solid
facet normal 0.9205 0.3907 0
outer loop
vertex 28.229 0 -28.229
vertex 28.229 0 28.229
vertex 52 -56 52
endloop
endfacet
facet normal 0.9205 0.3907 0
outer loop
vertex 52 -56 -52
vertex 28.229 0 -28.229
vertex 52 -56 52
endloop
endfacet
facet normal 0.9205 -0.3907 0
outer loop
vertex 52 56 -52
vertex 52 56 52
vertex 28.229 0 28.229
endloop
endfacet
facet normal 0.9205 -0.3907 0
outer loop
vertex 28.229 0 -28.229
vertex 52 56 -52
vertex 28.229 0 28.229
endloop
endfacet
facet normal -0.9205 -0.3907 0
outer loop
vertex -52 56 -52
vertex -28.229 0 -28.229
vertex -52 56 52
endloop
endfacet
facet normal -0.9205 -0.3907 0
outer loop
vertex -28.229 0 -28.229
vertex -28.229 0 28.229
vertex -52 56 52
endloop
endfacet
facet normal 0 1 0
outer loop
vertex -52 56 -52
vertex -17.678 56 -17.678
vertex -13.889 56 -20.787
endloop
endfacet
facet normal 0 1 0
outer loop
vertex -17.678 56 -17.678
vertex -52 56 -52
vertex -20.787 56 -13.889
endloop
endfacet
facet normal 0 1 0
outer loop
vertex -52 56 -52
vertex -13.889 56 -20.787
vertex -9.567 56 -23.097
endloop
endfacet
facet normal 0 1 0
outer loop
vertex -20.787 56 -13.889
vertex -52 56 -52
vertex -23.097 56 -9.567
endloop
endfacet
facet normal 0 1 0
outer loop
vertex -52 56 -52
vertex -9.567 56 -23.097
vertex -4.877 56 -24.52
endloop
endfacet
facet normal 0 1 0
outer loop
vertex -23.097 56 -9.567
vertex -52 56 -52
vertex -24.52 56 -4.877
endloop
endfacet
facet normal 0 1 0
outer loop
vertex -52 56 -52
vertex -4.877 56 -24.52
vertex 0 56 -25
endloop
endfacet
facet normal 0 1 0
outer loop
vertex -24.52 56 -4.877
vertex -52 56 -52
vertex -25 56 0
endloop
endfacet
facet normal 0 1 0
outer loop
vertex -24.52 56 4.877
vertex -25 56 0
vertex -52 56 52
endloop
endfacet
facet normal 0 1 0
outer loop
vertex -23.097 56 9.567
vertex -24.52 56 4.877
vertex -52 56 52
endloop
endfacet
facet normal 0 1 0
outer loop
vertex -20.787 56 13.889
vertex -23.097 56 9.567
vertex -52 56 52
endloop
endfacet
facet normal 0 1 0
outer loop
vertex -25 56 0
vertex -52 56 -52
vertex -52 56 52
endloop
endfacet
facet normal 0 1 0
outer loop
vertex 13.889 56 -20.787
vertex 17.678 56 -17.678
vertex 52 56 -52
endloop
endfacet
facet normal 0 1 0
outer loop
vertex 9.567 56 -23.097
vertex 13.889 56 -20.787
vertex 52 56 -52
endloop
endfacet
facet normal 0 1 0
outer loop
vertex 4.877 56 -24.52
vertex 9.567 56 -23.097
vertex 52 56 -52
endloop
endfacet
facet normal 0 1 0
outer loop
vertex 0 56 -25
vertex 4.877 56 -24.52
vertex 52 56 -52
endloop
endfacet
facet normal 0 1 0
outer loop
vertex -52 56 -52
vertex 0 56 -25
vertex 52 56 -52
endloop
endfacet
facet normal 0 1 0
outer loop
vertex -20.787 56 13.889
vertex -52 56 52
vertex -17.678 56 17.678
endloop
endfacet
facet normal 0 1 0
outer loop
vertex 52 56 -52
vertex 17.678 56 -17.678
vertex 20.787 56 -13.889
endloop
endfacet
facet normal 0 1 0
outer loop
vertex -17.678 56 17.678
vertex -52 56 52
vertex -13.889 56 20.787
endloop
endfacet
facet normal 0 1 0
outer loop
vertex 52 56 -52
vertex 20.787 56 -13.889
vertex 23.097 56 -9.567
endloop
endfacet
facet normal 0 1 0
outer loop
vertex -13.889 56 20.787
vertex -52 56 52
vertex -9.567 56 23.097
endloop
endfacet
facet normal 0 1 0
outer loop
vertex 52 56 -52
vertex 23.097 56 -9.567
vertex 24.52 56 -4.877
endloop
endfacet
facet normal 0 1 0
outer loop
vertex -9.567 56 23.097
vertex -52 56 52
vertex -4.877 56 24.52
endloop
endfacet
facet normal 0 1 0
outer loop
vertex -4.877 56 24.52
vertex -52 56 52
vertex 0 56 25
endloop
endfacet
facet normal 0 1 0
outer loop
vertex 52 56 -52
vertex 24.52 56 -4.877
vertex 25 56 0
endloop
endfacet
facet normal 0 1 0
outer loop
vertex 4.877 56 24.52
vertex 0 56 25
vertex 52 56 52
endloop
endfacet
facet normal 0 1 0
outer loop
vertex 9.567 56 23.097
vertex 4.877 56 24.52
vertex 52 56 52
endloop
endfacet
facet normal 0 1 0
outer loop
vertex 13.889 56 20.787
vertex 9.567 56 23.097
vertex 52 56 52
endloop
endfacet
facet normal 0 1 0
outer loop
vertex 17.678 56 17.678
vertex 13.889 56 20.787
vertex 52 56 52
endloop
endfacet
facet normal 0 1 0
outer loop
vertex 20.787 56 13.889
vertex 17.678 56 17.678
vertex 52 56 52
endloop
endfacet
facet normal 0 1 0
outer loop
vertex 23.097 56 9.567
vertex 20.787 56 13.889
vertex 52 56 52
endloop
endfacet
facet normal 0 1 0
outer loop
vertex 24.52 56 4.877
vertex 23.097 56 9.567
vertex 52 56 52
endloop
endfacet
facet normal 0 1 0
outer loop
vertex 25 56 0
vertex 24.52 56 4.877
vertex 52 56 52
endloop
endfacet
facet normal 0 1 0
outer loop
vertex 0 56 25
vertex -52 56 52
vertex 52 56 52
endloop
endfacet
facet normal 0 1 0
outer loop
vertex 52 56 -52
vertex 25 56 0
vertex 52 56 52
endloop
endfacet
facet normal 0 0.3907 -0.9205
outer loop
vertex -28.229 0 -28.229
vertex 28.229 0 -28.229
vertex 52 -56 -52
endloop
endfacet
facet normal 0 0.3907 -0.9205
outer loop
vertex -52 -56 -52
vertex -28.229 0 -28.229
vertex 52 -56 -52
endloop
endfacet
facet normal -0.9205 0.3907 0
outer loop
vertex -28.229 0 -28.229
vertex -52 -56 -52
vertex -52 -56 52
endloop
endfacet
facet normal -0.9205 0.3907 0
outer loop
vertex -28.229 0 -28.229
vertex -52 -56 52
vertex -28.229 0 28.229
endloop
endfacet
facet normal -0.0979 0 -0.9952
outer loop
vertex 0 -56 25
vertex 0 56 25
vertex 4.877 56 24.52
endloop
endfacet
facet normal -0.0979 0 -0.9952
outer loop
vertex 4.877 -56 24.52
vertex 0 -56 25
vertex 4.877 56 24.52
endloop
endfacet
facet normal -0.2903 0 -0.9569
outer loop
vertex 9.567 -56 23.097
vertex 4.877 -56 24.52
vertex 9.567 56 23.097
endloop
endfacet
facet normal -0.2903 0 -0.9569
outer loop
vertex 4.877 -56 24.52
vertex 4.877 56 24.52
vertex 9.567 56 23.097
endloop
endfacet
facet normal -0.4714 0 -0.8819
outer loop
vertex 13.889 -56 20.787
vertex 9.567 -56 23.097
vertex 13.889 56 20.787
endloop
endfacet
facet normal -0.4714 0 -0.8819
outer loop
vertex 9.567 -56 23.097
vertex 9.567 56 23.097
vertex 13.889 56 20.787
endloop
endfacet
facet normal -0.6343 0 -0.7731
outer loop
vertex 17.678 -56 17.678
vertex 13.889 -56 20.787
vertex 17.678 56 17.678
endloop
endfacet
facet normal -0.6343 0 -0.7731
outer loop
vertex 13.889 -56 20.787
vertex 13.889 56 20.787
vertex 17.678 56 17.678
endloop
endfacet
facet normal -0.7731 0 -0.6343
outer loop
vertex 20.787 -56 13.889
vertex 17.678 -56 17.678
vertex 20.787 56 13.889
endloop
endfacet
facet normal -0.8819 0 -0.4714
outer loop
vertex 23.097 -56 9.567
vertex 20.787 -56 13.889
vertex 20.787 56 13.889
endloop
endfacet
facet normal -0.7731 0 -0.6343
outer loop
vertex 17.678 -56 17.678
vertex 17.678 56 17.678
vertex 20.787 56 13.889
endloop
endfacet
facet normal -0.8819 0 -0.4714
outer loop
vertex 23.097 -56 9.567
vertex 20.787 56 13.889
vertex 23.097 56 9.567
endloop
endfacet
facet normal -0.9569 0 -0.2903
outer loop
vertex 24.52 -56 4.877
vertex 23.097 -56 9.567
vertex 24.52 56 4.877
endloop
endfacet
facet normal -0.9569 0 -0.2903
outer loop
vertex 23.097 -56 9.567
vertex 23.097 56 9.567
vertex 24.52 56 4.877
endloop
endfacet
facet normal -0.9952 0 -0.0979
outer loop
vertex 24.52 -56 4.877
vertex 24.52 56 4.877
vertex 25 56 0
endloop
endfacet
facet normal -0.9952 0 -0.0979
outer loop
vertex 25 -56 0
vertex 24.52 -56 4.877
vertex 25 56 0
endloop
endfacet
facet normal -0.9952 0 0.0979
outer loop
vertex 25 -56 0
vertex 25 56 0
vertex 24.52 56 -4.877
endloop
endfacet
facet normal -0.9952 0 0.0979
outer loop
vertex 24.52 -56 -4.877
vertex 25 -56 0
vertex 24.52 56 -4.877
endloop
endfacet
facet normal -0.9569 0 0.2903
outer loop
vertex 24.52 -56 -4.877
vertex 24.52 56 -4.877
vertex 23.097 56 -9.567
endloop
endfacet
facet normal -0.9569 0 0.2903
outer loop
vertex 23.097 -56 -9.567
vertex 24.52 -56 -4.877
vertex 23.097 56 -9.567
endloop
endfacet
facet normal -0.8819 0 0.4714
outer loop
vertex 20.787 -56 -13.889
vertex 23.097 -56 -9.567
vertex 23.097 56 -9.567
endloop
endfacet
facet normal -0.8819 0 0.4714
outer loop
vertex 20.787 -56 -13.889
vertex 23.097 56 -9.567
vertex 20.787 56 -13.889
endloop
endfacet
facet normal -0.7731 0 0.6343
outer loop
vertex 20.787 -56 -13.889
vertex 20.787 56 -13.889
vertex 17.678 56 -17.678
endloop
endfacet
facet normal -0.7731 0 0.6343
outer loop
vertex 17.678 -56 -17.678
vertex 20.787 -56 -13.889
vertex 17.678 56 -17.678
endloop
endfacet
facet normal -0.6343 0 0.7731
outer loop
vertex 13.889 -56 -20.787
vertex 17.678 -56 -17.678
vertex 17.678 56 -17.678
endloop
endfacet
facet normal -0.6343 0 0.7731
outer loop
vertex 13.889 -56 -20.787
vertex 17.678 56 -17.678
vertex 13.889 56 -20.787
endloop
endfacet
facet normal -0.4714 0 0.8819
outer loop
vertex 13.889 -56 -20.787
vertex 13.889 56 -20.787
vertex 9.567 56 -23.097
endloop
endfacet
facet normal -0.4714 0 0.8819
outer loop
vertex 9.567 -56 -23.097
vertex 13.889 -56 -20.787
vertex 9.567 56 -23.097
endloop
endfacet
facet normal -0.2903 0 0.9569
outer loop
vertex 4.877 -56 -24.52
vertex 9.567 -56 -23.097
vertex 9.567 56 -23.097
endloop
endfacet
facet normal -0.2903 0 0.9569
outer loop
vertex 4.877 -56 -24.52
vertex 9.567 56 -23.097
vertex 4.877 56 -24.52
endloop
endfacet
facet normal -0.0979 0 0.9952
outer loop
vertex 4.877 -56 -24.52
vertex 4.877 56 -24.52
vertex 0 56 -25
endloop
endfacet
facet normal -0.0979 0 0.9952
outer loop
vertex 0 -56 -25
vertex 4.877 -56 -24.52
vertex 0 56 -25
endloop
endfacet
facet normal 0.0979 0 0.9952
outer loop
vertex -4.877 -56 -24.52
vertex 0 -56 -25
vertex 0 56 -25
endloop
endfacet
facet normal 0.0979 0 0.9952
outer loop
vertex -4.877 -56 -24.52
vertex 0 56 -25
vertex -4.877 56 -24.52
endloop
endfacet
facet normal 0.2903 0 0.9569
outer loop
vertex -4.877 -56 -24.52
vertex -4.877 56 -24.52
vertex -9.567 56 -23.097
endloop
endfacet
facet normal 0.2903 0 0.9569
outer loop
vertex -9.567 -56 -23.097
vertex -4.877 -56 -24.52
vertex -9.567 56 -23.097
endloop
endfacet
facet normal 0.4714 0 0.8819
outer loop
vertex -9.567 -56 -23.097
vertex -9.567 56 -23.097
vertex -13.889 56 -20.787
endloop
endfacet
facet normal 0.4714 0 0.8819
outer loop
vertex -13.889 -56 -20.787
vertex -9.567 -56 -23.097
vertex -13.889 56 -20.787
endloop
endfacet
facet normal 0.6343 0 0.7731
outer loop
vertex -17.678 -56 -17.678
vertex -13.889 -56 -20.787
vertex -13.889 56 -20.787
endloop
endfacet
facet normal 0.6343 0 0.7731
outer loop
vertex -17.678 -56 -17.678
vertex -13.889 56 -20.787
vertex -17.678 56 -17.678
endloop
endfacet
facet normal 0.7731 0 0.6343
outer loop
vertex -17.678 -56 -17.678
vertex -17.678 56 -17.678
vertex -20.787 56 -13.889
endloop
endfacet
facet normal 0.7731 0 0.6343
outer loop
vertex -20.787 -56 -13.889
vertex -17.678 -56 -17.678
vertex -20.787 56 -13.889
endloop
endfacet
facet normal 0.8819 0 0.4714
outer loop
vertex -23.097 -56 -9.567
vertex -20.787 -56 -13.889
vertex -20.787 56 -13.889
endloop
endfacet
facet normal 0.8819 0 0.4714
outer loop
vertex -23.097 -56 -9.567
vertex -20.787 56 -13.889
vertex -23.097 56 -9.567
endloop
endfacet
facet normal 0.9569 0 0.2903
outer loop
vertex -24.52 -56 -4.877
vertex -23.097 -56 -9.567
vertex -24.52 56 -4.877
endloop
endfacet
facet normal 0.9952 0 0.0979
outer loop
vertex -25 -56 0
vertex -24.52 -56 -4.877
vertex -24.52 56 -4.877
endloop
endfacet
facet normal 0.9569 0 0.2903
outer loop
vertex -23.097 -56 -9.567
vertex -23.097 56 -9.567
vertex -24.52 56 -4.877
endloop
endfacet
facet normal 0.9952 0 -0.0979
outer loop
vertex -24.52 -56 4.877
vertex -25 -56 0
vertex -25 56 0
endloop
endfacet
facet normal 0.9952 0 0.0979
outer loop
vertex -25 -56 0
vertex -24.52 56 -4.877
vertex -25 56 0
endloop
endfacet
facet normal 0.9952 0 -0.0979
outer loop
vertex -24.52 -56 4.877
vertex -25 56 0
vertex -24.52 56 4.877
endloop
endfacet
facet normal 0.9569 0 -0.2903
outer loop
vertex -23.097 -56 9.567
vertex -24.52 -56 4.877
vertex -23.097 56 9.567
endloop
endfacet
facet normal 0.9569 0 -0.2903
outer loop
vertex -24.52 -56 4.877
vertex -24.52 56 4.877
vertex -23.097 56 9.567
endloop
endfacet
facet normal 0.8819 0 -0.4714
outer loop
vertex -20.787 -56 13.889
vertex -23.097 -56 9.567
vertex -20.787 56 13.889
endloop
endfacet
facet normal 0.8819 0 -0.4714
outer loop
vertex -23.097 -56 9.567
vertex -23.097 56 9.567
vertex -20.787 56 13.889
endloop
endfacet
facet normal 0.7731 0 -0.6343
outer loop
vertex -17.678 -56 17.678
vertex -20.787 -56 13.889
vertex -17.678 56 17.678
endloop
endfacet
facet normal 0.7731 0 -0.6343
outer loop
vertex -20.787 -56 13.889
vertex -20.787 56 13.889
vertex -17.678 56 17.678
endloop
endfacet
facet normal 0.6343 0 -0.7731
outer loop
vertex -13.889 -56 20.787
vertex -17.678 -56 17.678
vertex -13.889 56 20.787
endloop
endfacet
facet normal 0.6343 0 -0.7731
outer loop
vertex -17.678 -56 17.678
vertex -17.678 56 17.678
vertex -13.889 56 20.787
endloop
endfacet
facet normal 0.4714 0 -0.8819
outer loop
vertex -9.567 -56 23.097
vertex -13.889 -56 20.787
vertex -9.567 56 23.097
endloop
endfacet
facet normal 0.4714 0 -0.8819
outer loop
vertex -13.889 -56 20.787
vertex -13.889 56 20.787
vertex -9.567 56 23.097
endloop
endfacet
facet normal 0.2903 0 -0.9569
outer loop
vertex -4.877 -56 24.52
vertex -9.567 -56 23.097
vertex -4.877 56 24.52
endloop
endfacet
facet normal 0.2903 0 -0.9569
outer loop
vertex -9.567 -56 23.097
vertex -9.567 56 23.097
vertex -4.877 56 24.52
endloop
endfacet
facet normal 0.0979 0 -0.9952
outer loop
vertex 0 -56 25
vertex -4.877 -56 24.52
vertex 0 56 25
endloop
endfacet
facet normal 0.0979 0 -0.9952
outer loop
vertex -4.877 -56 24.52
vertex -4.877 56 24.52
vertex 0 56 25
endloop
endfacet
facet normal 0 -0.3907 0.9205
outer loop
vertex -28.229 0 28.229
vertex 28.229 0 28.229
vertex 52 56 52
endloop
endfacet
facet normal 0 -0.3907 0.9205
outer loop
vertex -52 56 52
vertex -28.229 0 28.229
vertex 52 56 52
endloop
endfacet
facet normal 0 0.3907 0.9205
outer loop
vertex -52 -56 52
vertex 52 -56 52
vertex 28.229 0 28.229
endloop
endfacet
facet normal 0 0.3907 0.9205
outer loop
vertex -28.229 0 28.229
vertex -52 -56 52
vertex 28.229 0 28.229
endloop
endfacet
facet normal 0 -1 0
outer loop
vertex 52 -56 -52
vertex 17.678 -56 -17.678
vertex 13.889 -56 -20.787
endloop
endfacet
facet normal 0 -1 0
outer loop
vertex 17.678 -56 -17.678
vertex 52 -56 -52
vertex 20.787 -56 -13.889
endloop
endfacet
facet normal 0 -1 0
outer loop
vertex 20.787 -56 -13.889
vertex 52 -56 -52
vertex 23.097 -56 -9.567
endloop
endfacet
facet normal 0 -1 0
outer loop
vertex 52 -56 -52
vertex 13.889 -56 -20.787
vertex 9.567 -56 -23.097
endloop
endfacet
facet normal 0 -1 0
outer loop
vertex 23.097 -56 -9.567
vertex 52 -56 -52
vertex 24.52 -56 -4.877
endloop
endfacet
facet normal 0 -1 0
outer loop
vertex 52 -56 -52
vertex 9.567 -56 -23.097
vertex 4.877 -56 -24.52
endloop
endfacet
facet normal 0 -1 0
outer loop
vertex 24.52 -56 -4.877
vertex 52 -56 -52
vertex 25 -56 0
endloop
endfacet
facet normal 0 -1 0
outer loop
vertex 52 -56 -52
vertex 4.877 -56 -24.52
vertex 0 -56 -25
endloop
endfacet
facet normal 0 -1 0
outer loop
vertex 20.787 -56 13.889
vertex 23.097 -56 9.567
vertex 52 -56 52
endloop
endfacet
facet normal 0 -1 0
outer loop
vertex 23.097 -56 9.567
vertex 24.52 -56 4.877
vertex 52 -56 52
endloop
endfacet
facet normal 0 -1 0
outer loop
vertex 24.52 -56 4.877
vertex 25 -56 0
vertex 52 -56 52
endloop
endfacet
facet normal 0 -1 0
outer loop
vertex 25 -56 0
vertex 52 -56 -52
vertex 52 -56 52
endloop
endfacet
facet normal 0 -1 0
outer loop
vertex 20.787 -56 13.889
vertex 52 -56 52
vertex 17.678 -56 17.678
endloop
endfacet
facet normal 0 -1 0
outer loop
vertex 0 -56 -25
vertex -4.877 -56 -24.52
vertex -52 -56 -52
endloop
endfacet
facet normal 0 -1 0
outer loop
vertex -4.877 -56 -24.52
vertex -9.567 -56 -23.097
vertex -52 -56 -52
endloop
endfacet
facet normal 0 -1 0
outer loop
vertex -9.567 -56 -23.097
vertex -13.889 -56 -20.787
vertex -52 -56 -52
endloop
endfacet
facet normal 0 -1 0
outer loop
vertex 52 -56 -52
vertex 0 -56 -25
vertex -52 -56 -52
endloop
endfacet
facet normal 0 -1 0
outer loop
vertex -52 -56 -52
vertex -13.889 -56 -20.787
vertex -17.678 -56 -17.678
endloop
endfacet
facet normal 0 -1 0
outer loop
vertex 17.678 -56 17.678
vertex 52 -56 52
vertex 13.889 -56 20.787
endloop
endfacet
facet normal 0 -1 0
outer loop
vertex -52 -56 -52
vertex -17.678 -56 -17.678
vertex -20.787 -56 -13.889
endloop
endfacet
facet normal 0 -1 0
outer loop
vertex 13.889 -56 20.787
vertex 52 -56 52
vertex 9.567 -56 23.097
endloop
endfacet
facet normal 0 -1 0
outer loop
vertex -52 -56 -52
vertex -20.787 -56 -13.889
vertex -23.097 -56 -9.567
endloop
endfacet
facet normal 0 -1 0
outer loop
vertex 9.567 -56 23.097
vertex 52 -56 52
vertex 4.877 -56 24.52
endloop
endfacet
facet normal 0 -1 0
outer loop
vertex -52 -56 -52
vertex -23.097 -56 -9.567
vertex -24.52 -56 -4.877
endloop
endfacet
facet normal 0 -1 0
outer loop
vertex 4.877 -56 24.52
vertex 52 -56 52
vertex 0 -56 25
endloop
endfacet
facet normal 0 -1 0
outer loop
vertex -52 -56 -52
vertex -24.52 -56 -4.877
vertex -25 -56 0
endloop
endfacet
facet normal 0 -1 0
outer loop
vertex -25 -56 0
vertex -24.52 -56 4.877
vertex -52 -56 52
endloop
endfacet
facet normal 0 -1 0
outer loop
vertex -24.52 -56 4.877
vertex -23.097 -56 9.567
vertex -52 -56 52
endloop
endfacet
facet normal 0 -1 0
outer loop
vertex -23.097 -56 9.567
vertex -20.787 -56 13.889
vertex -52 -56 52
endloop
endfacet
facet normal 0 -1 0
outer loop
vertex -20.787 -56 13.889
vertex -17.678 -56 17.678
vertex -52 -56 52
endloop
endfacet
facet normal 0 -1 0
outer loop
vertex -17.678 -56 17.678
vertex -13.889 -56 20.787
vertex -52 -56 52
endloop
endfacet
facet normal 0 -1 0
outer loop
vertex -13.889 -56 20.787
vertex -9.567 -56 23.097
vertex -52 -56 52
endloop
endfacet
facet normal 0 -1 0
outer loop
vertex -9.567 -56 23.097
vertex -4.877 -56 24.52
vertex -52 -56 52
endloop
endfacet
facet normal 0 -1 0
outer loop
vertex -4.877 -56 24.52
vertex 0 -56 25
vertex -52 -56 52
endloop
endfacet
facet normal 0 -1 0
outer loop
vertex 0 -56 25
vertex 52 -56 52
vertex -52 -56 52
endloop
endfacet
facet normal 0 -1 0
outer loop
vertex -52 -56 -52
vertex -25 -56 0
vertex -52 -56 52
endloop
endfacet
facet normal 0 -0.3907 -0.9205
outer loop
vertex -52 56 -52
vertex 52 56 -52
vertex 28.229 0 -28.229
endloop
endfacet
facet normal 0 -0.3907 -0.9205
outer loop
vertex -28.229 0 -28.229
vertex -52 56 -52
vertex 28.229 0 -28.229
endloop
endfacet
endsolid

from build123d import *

# Parameters (mm, degrees)
BOSS_EXTRU_2_DEPTH           = 52
ESQUISSE3_R                  = 25
ENL_V_MAT_EXTRU_1_DEPTH      = 134.985073796
ENL_V_MAT_EXTRU_2_DEPTH      = 93.433760066
ENL_V_MAT_EXTRU_2_DEPTH_BACK = 93.433760066


with BuildPart() as part:
    # Esquisse2 → Boss.-Extru.2 (new, symmetric)
    with BuildSketch(Plane.XY):
        Polygon((28.229410292, 0), (52, -56), (-52, -56), (-28.229410292, 0), align=None)
        Polygon((-28.229410292, 0), (-52, 56), (52, 56), (28.229410292, 0), align=None)
    extrude(amount=BOSS_EXTRU_2_DEPTH, both=True)

    # Esquisse3 → Enlèv. mat.-Extru.1 (cut, through all)
    with BuildSketch(Plane(origin=(0, 56, 0), x_dir=(1, 0, 0), z_dir=(0, 1, 0))):
        with Locations(Location((0, 0, 0), (0, 0, 270))):
            Circle(ESQUISSE3_R)
    extrude(amount=-ENL_V_MAT_EXTRU_1_DEPTH, mode=Mode.SUBTRACT)

    # Esquisse4 → Enlèv. mat.-Extru.2 (cut, two sides: drawn at the far end of the back side and taken through both)
    with BuildSketch(Plane(origin=(0, 0, 0), x_dir=(0, 0, -1), z_dir=(1, 0, 0)).offset(-ENL_V_MAT_EXTRU_2_DEPTH_BACK)):
        Polygon((-28.229410292, 0), (-52, 56), (-52, 1.282618983), (-52, -56), align=None)
        Polygon((52, 56), (28.229410292, 0), (52, -56), align=None)
    extrude(amount=ENL_V_MAT_EXTRU_2_DEPTH + ENL_V_MAT_EXTRU_2_DEPTH_BACK, mode=Mode.SUBTRACT)


solid = part.part
